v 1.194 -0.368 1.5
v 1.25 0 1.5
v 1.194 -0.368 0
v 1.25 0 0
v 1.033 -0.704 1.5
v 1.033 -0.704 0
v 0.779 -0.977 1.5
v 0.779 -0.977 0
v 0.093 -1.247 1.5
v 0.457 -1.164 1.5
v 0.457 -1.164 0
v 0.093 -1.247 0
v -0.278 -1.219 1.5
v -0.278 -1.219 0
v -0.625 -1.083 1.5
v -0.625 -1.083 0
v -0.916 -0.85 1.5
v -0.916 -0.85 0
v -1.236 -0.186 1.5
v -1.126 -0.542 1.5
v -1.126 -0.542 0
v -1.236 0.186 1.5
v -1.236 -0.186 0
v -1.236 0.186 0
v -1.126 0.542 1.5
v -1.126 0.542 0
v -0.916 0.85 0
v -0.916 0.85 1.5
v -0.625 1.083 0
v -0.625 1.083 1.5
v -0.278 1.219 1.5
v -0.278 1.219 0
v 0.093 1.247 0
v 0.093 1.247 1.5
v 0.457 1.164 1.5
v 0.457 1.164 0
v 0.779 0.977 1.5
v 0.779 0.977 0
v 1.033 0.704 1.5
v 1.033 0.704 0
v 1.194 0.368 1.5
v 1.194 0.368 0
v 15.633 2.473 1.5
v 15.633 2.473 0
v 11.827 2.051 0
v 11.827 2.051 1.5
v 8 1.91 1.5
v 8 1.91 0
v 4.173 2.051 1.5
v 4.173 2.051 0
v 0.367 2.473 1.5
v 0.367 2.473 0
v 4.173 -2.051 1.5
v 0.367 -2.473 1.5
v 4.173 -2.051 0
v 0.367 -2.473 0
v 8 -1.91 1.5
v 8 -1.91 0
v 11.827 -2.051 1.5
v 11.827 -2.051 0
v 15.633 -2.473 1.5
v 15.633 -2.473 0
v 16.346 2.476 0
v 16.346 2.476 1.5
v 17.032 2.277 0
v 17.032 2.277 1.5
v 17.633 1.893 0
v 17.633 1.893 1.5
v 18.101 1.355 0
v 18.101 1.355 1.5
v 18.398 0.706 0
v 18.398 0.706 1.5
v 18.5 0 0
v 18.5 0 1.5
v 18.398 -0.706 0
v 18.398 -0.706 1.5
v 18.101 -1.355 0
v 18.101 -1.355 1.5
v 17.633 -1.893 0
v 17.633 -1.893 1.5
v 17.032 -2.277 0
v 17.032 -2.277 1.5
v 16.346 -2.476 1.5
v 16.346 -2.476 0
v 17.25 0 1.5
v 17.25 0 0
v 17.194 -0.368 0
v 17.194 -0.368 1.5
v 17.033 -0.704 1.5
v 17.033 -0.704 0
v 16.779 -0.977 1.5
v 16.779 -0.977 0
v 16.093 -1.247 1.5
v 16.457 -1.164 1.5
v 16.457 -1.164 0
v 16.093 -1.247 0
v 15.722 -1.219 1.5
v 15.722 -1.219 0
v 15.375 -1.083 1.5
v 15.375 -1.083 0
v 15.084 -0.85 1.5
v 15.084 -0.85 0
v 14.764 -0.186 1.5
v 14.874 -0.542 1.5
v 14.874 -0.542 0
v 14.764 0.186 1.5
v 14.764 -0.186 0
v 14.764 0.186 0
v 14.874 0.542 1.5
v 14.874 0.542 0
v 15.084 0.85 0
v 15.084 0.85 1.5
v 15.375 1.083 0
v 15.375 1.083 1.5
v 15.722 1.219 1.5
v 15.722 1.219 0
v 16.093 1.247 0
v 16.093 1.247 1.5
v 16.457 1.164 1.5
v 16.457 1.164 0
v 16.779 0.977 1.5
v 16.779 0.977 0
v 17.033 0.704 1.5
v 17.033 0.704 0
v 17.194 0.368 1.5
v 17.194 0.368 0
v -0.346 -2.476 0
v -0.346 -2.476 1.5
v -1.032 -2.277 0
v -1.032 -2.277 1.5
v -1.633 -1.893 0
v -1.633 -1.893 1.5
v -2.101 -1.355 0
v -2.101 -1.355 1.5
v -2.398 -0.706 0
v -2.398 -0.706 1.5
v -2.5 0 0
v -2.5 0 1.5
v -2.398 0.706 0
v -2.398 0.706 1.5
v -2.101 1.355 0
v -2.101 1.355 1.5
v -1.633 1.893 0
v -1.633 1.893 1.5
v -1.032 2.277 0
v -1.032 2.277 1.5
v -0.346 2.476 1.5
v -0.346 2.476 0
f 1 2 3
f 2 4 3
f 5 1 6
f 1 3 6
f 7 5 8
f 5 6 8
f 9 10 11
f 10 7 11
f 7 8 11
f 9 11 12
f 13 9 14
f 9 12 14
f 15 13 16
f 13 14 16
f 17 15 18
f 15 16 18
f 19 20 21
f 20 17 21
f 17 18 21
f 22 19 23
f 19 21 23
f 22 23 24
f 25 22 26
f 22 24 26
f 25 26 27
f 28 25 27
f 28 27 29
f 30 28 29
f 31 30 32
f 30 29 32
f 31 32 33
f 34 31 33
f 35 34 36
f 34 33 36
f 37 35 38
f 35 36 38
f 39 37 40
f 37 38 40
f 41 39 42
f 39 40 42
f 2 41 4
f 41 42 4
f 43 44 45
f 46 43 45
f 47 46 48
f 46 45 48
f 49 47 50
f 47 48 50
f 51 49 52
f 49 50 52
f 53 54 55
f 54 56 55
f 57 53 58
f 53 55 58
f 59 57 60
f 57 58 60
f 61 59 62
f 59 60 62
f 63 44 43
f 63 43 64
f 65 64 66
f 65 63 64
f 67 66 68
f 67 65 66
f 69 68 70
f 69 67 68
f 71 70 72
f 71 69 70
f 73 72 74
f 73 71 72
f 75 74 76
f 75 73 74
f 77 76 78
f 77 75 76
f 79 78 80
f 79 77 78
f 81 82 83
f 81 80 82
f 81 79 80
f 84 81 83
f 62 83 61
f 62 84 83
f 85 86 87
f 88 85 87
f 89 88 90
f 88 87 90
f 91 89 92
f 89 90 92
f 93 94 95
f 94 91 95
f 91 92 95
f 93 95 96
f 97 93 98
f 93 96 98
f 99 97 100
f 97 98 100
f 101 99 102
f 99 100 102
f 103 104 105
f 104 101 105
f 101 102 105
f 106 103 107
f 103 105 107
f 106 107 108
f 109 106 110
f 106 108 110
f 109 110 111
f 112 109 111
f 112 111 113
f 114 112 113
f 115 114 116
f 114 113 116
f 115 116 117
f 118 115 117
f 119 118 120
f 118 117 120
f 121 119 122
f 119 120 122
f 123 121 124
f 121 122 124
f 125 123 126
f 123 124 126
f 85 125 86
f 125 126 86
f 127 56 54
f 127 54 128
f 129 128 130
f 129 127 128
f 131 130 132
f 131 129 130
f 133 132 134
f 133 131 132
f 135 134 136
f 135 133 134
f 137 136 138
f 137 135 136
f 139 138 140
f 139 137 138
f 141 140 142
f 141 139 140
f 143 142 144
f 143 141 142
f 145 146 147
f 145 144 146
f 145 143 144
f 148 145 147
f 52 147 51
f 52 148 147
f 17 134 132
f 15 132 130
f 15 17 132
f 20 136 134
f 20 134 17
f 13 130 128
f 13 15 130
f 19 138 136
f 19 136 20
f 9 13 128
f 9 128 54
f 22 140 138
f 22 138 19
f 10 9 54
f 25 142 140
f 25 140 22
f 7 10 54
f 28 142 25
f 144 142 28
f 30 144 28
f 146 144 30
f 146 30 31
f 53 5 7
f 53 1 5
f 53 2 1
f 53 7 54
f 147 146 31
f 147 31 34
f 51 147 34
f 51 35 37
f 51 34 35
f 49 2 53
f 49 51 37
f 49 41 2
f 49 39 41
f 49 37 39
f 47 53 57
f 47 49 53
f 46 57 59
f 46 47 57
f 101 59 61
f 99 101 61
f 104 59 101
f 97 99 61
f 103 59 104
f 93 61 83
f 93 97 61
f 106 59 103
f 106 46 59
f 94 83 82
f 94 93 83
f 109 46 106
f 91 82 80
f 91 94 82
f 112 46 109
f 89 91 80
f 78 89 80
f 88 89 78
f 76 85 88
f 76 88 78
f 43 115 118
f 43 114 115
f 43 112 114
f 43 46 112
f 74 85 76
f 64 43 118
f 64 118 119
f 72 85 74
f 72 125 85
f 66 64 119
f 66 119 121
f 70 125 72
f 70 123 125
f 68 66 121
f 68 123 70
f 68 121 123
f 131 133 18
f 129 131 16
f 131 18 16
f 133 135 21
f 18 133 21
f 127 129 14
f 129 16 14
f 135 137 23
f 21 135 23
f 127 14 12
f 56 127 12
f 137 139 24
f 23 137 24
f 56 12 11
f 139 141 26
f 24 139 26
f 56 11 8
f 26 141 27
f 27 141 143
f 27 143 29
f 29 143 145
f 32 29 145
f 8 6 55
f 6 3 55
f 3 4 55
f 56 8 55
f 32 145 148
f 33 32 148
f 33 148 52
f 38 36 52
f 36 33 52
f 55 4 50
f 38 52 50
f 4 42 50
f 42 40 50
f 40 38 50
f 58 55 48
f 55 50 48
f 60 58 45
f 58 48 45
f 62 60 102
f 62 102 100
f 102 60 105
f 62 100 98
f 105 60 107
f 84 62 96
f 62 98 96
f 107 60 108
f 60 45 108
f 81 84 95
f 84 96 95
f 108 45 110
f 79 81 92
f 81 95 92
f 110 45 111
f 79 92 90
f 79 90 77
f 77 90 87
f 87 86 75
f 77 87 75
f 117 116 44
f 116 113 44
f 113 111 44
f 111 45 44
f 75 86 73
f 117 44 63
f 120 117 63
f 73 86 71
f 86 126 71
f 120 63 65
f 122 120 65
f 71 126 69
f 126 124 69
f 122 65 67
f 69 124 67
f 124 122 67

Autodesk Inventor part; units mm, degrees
ref_plane "YZ Plane" through (0, 0, 0) normal (1, 0, 0) x (0, 1, 0)
ref_plane "XZ Plane" through (0, 0, 0) normal (0, 1, 0) x (-1, 0, 0)
ref_plane "XY Plane" through (0, 0, 0) normal (0, 0, 1) x (1, 0, 0)
sketch "Sketch1" plane through (0, 0, 0) normal (0, 0, 1) x (1, 0, 0)
  circle A0 centre (0, 0) radius 1.25
  line L0 (0, 0) -> (16, 0) construction
  circle A1 centre (16, 0) radius 1.25
  arc A2 (0.367, 2.4729) -> (0.367, -2.4729) centre (0, 0) ccw
  arc A3 (15.633, -2.4729) -> (15.633, 2.4729) centre (16, 0) ccw
  arc A4 (0.367, 2.4729) -> (15.633, 2.4729) centre (8, 53.9096) ccw
  arc A5 (15.633, -2.4729) -> (0.367, -2.4729) centre (8, -53.9096) ccw
  dimension "d0" = 2.5
  dimension "d1" = 16
  dimension "d8" = 5
  dimension "d15" = 52
extrude "Extrusion1" add sketch "Sketch1" along normal blind 1.5
properties part number "linkageB"
